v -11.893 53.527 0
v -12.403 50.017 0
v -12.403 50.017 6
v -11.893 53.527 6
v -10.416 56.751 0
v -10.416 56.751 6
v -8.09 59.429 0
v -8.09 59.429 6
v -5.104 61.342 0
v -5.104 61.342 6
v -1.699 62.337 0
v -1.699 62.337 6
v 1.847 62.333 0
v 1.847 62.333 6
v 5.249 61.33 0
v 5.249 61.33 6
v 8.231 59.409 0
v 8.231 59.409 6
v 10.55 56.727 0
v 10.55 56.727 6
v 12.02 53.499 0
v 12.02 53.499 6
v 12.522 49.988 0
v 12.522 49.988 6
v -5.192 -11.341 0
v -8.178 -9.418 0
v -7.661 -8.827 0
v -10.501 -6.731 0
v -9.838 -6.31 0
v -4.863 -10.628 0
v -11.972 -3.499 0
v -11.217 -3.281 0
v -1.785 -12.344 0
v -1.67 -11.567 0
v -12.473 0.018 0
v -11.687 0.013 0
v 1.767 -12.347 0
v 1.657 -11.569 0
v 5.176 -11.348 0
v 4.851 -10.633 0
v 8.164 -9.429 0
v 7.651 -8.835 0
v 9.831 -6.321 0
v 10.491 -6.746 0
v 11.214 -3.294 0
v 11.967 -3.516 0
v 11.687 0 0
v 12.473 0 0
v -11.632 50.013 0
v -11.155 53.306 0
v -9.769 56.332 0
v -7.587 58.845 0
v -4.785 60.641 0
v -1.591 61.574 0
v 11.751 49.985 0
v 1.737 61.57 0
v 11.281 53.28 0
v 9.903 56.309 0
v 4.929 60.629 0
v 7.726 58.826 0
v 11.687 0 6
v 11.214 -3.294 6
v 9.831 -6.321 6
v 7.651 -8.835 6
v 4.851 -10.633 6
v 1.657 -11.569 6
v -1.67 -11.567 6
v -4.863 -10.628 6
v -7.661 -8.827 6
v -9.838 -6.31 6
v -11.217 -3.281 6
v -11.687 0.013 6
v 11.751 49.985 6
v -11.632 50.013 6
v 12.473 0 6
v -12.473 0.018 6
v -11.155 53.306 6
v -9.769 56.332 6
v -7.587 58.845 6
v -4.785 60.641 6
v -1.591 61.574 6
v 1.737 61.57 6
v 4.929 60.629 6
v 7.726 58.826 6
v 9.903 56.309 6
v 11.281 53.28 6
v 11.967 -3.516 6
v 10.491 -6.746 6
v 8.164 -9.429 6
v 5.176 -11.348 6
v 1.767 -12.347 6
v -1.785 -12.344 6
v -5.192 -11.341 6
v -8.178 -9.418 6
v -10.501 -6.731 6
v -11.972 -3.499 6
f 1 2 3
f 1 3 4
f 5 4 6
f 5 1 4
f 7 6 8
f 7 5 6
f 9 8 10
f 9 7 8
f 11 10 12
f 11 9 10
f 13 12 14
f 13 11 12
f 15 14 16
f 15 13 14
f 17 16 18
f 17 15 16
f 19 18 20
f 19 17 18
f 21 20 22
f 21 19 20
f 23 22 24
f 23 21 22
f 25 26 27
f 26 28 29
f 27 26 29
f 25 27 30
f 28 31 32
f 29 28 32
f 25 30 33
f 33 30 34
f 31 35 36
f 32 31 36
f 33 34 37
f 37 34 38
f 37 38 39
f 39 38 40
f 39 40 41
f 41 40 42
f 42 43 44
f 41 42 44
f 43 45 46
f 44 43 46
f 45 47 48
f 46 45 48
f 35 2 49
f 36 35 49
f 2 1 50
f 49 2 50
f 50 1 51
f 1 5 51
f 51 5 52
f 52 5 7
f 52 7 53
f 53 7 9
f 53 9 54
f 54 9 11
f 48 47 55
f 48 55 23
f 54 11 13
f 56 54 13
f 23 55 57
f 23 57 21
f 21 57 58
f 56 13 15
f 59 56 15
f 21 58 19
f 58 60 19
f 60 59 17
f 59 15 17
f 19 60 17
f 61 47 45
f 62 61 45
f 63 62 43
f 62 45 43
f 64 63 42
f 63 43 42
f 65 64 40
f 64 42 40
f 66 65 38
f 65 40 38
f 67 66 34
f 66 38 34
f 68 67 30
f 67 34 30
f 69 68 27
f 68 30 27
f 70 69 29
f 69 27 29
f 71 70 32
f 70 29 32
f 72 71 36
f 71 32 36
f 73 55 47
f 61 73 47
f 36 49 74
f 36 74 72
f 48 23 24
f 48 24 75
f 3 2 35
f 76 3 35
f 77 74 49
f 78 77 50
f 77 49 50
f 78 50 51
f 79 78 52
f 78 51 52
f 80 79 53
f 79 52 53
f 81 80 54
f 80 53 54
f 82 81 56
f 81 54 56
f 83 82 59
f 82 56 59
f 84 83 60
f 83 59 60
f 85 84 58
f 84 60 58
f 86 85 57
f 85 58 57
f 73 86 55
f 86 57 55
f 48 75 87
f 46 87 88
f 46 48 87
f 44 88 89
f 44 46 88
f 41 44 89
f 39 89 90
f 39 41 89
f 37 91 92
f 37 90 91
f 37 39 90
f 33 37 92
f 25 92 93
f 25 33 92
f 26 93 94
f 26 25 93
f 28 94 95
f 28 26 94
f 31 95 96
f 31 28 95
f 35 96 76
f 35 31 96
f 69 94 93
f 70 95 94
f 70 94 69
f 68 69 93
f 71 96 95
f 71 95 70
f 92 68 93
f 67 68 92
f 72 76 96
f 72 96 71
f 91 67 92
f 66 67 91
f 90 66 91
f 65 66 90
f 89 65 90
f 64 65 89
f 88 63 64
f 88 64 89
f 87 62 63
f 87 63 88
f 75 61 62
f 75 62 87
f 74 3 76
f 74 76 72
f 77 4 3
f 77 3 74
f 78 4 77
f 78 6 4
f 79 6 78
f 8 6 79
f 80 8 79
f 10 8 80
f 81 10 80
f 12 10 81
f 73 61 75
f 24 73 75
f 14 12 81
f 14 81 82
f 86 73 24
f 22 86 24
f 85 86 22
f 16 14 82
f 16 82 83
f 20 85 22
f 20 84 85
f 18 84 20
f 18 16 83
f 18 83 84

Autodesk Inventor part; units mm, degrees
ref_plane "YZ Plane" through (0, 0, 0) normal (1, 0, 0) x (0, 1, 0)
ref_plane "XZ Plane" through (0, 0, 0) normal (0, 1, 0) x (-1, 0, 0)
ref_plane "XY Plane" through (0, 0, 0) normal (0, 0, 1) x (1, 0, 0)
sketch "Эскиз1" plane through (0, 0, 0) normal (0, 0, 1) x (1, 0, 0)
  spline S0 degree 3 number of poles 571 construction
  circle A0 centre (0, 0) radius 12.4728
  circle A1 centre (0, 0) radius 11.6873
  spline S1 degree 3 number of poles 571 construction
  circle A2 centre (0.0593, 50) radius 3.05 construction
  circle A3 centre (0.0593, 50) radius 12.4622
  circle A4 centre (0.0593, 50) radius 11.6915
  line L0 (12.5215, 49.9878) -> (12.4728, -0.0121)
  line L1 (-12.4028, 50.0174) -> (-12.4728, 0.0175)
  line L2 (-11.6322, 50.0129) -> (-11.6873, 0.0129)
  line L3 (-11.6921, -4.3435) -> (-11.689, -1.4984)
  line L4 (11.7508, 49.9851) -> (11.6873, -0.0148)
  line L5 (0, 0) -> (-30.3964, 0.0335) construction
  point P0 (-23.5791, 58.2576)
  point P1 (2.2116, 51.4848)
  point P2 (12.4728, 0)
  dimension "d0" = 24.9244
  dimension "d1" = 24.9457
  dimension "d2" = 23.383
  dimension "d3" = 23.3746
  dimension "d6" = 50
extrude "Выдавливание1" add sketch "Эскиз1" along normal blind 6 contours A0 L2 A1 L4 | L1 A3 L2 A0 | A3 L4 A4 L2 | L4 A3 L0 A0 picked at (-11.8082, -1.4117) picked at (12.144, 50.9937)
properties part number "Ремень"
